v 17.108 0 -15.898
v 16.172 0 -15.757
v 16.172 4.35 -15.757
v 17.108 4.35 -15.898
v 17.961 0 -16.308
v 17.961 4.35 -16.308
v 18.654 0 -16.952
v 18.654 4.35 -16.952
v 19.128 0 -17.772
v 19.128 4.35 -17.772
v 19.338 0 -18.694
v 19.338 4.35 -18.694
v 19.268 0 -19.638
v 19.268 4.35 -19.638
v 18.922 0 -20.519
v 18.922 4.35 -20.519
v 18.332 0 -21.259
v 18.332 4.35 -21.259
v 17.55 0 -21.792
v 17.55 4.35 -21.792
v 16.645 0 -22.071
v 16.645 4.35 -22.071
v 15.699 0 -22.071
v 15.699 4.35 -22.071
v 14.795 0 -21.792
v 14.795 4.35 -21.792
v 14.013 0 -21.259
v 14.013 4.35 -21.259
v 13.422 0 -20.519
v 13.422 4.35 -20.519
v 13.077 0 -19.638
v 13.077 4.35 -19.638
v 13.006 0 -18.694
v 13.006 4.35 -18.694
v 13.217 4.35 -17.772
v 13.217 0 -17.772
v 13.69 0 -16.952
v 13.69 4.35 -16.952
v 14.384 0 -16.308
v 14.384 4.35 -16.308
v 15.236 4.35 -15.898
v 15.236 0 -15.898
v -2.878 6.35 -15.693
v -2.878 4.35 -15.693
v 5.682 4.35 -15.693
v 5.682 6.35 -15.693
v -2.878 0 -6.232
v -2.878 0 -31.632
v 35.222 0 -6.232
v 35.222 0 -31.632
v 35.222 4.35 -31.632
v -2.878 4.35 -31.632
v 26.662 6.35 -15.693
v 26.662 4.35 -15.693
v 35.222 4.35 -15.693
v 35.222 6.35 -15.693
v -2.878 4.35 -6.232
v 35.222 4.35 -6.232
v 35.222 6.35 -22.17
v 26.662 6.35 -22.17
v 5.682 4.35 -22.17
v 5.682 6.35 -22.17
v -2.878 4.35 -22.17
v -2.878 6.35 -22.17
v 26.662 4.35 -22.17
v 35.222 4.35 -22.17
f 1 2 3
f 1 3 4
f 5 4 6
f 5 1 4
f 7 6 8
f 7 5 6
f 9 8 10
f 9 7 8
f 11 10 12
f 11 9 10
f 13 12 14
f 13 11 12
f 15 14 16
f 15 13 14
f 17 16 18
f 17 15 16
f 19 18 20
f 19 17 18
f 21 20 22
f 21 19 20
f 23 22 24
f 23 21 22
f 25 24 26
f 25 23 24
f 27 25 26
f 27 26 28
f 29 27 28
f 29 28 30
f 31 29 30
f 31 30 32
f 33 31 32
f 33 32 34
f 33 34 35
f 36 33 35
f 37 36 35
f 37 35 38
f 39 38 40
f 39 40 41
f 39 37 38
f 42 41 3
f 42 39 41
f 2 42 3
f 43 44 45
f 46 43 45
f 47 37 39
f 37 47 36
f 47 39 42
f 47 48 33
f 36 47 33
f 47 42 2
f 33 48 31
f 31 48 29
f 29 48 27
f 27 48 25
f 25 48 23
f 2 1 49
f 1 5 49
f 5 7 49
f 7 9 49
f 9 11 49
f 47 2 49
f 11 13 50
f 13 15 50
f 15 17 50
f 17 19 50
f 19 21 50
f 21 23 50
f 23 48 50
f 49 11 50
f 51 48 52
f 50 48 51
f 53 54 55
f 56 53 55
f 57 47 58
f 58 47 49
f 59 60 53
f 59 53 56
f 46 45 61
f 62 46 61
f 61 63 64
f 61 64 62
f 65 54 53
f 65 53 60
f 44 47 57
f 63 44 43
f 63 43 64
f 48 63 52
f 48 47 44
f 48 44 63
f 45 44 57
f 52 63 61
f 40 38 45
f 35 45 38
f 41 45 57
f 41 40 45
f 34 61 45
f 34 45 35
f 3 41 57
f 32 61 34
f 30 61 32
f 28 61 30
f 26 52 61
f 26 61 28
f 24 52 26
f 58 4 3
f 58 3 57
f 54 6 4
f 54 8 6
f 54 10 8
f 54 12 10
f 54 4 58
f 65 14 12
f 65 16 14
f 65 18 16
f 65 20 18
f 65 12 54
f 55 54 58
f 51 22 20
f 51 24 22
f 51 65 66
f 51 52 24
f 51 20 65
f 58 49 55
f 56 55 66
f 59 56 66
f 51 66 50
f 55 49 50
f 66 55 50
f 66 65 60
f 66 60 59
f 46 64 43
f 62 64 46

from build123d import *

# Parameters (mm, degrees)
SKETCH1_W           = 38.1
SKETCH1_H           = 25.4
SKETCH1_R           = 3.175
BOSS_EXTRUDE1_DEPTH = 4.35
SKETCH2_W           = 8.5598
SKETCH2_H           = 6.476913764
BOSS_EXTRUDE2_DEPTH = 2


with BuildPart() as part:
    # Sketch1 → Boss-Extrude1 (new body)
    with BuildSketch(Plane(origin=(0, 0, 0), x_dir=(1, 0, 0), z_dir=(0, 1, 0))):
        with Locations((16.172116278, 18.931628639)):
            Rectangle(SKETCH1_W, SKETCH1_H)
        with Locations(Location((16.172116278, 18.931628639, 0), (0, 0, 270))):
            Circle(SKETCH1_R, mode=Mode.SUBTRACT)
    extrude(amount=BOSS_EXTRUDE1_DEPTH)

    # Sketch2 → Boss-Extrude2 (add)
    with BuildSketch(Plane(origin=(0, 4.35, 0), x_dir=(1, 0, 0), z_dir=(0, 1, 0))):
        with Locations((1.402016278, 18.931628639)):
            Rectangle(SKETCH2_W, SKETCH2_H)
        with Locations((30.942216278, 18.931628639)):
            Rectangle(SKETCH2_W, SKETCH2_H)
    extrude(amount=BOSS_EXTRUDE2_DEPTH)


solid = part.part
